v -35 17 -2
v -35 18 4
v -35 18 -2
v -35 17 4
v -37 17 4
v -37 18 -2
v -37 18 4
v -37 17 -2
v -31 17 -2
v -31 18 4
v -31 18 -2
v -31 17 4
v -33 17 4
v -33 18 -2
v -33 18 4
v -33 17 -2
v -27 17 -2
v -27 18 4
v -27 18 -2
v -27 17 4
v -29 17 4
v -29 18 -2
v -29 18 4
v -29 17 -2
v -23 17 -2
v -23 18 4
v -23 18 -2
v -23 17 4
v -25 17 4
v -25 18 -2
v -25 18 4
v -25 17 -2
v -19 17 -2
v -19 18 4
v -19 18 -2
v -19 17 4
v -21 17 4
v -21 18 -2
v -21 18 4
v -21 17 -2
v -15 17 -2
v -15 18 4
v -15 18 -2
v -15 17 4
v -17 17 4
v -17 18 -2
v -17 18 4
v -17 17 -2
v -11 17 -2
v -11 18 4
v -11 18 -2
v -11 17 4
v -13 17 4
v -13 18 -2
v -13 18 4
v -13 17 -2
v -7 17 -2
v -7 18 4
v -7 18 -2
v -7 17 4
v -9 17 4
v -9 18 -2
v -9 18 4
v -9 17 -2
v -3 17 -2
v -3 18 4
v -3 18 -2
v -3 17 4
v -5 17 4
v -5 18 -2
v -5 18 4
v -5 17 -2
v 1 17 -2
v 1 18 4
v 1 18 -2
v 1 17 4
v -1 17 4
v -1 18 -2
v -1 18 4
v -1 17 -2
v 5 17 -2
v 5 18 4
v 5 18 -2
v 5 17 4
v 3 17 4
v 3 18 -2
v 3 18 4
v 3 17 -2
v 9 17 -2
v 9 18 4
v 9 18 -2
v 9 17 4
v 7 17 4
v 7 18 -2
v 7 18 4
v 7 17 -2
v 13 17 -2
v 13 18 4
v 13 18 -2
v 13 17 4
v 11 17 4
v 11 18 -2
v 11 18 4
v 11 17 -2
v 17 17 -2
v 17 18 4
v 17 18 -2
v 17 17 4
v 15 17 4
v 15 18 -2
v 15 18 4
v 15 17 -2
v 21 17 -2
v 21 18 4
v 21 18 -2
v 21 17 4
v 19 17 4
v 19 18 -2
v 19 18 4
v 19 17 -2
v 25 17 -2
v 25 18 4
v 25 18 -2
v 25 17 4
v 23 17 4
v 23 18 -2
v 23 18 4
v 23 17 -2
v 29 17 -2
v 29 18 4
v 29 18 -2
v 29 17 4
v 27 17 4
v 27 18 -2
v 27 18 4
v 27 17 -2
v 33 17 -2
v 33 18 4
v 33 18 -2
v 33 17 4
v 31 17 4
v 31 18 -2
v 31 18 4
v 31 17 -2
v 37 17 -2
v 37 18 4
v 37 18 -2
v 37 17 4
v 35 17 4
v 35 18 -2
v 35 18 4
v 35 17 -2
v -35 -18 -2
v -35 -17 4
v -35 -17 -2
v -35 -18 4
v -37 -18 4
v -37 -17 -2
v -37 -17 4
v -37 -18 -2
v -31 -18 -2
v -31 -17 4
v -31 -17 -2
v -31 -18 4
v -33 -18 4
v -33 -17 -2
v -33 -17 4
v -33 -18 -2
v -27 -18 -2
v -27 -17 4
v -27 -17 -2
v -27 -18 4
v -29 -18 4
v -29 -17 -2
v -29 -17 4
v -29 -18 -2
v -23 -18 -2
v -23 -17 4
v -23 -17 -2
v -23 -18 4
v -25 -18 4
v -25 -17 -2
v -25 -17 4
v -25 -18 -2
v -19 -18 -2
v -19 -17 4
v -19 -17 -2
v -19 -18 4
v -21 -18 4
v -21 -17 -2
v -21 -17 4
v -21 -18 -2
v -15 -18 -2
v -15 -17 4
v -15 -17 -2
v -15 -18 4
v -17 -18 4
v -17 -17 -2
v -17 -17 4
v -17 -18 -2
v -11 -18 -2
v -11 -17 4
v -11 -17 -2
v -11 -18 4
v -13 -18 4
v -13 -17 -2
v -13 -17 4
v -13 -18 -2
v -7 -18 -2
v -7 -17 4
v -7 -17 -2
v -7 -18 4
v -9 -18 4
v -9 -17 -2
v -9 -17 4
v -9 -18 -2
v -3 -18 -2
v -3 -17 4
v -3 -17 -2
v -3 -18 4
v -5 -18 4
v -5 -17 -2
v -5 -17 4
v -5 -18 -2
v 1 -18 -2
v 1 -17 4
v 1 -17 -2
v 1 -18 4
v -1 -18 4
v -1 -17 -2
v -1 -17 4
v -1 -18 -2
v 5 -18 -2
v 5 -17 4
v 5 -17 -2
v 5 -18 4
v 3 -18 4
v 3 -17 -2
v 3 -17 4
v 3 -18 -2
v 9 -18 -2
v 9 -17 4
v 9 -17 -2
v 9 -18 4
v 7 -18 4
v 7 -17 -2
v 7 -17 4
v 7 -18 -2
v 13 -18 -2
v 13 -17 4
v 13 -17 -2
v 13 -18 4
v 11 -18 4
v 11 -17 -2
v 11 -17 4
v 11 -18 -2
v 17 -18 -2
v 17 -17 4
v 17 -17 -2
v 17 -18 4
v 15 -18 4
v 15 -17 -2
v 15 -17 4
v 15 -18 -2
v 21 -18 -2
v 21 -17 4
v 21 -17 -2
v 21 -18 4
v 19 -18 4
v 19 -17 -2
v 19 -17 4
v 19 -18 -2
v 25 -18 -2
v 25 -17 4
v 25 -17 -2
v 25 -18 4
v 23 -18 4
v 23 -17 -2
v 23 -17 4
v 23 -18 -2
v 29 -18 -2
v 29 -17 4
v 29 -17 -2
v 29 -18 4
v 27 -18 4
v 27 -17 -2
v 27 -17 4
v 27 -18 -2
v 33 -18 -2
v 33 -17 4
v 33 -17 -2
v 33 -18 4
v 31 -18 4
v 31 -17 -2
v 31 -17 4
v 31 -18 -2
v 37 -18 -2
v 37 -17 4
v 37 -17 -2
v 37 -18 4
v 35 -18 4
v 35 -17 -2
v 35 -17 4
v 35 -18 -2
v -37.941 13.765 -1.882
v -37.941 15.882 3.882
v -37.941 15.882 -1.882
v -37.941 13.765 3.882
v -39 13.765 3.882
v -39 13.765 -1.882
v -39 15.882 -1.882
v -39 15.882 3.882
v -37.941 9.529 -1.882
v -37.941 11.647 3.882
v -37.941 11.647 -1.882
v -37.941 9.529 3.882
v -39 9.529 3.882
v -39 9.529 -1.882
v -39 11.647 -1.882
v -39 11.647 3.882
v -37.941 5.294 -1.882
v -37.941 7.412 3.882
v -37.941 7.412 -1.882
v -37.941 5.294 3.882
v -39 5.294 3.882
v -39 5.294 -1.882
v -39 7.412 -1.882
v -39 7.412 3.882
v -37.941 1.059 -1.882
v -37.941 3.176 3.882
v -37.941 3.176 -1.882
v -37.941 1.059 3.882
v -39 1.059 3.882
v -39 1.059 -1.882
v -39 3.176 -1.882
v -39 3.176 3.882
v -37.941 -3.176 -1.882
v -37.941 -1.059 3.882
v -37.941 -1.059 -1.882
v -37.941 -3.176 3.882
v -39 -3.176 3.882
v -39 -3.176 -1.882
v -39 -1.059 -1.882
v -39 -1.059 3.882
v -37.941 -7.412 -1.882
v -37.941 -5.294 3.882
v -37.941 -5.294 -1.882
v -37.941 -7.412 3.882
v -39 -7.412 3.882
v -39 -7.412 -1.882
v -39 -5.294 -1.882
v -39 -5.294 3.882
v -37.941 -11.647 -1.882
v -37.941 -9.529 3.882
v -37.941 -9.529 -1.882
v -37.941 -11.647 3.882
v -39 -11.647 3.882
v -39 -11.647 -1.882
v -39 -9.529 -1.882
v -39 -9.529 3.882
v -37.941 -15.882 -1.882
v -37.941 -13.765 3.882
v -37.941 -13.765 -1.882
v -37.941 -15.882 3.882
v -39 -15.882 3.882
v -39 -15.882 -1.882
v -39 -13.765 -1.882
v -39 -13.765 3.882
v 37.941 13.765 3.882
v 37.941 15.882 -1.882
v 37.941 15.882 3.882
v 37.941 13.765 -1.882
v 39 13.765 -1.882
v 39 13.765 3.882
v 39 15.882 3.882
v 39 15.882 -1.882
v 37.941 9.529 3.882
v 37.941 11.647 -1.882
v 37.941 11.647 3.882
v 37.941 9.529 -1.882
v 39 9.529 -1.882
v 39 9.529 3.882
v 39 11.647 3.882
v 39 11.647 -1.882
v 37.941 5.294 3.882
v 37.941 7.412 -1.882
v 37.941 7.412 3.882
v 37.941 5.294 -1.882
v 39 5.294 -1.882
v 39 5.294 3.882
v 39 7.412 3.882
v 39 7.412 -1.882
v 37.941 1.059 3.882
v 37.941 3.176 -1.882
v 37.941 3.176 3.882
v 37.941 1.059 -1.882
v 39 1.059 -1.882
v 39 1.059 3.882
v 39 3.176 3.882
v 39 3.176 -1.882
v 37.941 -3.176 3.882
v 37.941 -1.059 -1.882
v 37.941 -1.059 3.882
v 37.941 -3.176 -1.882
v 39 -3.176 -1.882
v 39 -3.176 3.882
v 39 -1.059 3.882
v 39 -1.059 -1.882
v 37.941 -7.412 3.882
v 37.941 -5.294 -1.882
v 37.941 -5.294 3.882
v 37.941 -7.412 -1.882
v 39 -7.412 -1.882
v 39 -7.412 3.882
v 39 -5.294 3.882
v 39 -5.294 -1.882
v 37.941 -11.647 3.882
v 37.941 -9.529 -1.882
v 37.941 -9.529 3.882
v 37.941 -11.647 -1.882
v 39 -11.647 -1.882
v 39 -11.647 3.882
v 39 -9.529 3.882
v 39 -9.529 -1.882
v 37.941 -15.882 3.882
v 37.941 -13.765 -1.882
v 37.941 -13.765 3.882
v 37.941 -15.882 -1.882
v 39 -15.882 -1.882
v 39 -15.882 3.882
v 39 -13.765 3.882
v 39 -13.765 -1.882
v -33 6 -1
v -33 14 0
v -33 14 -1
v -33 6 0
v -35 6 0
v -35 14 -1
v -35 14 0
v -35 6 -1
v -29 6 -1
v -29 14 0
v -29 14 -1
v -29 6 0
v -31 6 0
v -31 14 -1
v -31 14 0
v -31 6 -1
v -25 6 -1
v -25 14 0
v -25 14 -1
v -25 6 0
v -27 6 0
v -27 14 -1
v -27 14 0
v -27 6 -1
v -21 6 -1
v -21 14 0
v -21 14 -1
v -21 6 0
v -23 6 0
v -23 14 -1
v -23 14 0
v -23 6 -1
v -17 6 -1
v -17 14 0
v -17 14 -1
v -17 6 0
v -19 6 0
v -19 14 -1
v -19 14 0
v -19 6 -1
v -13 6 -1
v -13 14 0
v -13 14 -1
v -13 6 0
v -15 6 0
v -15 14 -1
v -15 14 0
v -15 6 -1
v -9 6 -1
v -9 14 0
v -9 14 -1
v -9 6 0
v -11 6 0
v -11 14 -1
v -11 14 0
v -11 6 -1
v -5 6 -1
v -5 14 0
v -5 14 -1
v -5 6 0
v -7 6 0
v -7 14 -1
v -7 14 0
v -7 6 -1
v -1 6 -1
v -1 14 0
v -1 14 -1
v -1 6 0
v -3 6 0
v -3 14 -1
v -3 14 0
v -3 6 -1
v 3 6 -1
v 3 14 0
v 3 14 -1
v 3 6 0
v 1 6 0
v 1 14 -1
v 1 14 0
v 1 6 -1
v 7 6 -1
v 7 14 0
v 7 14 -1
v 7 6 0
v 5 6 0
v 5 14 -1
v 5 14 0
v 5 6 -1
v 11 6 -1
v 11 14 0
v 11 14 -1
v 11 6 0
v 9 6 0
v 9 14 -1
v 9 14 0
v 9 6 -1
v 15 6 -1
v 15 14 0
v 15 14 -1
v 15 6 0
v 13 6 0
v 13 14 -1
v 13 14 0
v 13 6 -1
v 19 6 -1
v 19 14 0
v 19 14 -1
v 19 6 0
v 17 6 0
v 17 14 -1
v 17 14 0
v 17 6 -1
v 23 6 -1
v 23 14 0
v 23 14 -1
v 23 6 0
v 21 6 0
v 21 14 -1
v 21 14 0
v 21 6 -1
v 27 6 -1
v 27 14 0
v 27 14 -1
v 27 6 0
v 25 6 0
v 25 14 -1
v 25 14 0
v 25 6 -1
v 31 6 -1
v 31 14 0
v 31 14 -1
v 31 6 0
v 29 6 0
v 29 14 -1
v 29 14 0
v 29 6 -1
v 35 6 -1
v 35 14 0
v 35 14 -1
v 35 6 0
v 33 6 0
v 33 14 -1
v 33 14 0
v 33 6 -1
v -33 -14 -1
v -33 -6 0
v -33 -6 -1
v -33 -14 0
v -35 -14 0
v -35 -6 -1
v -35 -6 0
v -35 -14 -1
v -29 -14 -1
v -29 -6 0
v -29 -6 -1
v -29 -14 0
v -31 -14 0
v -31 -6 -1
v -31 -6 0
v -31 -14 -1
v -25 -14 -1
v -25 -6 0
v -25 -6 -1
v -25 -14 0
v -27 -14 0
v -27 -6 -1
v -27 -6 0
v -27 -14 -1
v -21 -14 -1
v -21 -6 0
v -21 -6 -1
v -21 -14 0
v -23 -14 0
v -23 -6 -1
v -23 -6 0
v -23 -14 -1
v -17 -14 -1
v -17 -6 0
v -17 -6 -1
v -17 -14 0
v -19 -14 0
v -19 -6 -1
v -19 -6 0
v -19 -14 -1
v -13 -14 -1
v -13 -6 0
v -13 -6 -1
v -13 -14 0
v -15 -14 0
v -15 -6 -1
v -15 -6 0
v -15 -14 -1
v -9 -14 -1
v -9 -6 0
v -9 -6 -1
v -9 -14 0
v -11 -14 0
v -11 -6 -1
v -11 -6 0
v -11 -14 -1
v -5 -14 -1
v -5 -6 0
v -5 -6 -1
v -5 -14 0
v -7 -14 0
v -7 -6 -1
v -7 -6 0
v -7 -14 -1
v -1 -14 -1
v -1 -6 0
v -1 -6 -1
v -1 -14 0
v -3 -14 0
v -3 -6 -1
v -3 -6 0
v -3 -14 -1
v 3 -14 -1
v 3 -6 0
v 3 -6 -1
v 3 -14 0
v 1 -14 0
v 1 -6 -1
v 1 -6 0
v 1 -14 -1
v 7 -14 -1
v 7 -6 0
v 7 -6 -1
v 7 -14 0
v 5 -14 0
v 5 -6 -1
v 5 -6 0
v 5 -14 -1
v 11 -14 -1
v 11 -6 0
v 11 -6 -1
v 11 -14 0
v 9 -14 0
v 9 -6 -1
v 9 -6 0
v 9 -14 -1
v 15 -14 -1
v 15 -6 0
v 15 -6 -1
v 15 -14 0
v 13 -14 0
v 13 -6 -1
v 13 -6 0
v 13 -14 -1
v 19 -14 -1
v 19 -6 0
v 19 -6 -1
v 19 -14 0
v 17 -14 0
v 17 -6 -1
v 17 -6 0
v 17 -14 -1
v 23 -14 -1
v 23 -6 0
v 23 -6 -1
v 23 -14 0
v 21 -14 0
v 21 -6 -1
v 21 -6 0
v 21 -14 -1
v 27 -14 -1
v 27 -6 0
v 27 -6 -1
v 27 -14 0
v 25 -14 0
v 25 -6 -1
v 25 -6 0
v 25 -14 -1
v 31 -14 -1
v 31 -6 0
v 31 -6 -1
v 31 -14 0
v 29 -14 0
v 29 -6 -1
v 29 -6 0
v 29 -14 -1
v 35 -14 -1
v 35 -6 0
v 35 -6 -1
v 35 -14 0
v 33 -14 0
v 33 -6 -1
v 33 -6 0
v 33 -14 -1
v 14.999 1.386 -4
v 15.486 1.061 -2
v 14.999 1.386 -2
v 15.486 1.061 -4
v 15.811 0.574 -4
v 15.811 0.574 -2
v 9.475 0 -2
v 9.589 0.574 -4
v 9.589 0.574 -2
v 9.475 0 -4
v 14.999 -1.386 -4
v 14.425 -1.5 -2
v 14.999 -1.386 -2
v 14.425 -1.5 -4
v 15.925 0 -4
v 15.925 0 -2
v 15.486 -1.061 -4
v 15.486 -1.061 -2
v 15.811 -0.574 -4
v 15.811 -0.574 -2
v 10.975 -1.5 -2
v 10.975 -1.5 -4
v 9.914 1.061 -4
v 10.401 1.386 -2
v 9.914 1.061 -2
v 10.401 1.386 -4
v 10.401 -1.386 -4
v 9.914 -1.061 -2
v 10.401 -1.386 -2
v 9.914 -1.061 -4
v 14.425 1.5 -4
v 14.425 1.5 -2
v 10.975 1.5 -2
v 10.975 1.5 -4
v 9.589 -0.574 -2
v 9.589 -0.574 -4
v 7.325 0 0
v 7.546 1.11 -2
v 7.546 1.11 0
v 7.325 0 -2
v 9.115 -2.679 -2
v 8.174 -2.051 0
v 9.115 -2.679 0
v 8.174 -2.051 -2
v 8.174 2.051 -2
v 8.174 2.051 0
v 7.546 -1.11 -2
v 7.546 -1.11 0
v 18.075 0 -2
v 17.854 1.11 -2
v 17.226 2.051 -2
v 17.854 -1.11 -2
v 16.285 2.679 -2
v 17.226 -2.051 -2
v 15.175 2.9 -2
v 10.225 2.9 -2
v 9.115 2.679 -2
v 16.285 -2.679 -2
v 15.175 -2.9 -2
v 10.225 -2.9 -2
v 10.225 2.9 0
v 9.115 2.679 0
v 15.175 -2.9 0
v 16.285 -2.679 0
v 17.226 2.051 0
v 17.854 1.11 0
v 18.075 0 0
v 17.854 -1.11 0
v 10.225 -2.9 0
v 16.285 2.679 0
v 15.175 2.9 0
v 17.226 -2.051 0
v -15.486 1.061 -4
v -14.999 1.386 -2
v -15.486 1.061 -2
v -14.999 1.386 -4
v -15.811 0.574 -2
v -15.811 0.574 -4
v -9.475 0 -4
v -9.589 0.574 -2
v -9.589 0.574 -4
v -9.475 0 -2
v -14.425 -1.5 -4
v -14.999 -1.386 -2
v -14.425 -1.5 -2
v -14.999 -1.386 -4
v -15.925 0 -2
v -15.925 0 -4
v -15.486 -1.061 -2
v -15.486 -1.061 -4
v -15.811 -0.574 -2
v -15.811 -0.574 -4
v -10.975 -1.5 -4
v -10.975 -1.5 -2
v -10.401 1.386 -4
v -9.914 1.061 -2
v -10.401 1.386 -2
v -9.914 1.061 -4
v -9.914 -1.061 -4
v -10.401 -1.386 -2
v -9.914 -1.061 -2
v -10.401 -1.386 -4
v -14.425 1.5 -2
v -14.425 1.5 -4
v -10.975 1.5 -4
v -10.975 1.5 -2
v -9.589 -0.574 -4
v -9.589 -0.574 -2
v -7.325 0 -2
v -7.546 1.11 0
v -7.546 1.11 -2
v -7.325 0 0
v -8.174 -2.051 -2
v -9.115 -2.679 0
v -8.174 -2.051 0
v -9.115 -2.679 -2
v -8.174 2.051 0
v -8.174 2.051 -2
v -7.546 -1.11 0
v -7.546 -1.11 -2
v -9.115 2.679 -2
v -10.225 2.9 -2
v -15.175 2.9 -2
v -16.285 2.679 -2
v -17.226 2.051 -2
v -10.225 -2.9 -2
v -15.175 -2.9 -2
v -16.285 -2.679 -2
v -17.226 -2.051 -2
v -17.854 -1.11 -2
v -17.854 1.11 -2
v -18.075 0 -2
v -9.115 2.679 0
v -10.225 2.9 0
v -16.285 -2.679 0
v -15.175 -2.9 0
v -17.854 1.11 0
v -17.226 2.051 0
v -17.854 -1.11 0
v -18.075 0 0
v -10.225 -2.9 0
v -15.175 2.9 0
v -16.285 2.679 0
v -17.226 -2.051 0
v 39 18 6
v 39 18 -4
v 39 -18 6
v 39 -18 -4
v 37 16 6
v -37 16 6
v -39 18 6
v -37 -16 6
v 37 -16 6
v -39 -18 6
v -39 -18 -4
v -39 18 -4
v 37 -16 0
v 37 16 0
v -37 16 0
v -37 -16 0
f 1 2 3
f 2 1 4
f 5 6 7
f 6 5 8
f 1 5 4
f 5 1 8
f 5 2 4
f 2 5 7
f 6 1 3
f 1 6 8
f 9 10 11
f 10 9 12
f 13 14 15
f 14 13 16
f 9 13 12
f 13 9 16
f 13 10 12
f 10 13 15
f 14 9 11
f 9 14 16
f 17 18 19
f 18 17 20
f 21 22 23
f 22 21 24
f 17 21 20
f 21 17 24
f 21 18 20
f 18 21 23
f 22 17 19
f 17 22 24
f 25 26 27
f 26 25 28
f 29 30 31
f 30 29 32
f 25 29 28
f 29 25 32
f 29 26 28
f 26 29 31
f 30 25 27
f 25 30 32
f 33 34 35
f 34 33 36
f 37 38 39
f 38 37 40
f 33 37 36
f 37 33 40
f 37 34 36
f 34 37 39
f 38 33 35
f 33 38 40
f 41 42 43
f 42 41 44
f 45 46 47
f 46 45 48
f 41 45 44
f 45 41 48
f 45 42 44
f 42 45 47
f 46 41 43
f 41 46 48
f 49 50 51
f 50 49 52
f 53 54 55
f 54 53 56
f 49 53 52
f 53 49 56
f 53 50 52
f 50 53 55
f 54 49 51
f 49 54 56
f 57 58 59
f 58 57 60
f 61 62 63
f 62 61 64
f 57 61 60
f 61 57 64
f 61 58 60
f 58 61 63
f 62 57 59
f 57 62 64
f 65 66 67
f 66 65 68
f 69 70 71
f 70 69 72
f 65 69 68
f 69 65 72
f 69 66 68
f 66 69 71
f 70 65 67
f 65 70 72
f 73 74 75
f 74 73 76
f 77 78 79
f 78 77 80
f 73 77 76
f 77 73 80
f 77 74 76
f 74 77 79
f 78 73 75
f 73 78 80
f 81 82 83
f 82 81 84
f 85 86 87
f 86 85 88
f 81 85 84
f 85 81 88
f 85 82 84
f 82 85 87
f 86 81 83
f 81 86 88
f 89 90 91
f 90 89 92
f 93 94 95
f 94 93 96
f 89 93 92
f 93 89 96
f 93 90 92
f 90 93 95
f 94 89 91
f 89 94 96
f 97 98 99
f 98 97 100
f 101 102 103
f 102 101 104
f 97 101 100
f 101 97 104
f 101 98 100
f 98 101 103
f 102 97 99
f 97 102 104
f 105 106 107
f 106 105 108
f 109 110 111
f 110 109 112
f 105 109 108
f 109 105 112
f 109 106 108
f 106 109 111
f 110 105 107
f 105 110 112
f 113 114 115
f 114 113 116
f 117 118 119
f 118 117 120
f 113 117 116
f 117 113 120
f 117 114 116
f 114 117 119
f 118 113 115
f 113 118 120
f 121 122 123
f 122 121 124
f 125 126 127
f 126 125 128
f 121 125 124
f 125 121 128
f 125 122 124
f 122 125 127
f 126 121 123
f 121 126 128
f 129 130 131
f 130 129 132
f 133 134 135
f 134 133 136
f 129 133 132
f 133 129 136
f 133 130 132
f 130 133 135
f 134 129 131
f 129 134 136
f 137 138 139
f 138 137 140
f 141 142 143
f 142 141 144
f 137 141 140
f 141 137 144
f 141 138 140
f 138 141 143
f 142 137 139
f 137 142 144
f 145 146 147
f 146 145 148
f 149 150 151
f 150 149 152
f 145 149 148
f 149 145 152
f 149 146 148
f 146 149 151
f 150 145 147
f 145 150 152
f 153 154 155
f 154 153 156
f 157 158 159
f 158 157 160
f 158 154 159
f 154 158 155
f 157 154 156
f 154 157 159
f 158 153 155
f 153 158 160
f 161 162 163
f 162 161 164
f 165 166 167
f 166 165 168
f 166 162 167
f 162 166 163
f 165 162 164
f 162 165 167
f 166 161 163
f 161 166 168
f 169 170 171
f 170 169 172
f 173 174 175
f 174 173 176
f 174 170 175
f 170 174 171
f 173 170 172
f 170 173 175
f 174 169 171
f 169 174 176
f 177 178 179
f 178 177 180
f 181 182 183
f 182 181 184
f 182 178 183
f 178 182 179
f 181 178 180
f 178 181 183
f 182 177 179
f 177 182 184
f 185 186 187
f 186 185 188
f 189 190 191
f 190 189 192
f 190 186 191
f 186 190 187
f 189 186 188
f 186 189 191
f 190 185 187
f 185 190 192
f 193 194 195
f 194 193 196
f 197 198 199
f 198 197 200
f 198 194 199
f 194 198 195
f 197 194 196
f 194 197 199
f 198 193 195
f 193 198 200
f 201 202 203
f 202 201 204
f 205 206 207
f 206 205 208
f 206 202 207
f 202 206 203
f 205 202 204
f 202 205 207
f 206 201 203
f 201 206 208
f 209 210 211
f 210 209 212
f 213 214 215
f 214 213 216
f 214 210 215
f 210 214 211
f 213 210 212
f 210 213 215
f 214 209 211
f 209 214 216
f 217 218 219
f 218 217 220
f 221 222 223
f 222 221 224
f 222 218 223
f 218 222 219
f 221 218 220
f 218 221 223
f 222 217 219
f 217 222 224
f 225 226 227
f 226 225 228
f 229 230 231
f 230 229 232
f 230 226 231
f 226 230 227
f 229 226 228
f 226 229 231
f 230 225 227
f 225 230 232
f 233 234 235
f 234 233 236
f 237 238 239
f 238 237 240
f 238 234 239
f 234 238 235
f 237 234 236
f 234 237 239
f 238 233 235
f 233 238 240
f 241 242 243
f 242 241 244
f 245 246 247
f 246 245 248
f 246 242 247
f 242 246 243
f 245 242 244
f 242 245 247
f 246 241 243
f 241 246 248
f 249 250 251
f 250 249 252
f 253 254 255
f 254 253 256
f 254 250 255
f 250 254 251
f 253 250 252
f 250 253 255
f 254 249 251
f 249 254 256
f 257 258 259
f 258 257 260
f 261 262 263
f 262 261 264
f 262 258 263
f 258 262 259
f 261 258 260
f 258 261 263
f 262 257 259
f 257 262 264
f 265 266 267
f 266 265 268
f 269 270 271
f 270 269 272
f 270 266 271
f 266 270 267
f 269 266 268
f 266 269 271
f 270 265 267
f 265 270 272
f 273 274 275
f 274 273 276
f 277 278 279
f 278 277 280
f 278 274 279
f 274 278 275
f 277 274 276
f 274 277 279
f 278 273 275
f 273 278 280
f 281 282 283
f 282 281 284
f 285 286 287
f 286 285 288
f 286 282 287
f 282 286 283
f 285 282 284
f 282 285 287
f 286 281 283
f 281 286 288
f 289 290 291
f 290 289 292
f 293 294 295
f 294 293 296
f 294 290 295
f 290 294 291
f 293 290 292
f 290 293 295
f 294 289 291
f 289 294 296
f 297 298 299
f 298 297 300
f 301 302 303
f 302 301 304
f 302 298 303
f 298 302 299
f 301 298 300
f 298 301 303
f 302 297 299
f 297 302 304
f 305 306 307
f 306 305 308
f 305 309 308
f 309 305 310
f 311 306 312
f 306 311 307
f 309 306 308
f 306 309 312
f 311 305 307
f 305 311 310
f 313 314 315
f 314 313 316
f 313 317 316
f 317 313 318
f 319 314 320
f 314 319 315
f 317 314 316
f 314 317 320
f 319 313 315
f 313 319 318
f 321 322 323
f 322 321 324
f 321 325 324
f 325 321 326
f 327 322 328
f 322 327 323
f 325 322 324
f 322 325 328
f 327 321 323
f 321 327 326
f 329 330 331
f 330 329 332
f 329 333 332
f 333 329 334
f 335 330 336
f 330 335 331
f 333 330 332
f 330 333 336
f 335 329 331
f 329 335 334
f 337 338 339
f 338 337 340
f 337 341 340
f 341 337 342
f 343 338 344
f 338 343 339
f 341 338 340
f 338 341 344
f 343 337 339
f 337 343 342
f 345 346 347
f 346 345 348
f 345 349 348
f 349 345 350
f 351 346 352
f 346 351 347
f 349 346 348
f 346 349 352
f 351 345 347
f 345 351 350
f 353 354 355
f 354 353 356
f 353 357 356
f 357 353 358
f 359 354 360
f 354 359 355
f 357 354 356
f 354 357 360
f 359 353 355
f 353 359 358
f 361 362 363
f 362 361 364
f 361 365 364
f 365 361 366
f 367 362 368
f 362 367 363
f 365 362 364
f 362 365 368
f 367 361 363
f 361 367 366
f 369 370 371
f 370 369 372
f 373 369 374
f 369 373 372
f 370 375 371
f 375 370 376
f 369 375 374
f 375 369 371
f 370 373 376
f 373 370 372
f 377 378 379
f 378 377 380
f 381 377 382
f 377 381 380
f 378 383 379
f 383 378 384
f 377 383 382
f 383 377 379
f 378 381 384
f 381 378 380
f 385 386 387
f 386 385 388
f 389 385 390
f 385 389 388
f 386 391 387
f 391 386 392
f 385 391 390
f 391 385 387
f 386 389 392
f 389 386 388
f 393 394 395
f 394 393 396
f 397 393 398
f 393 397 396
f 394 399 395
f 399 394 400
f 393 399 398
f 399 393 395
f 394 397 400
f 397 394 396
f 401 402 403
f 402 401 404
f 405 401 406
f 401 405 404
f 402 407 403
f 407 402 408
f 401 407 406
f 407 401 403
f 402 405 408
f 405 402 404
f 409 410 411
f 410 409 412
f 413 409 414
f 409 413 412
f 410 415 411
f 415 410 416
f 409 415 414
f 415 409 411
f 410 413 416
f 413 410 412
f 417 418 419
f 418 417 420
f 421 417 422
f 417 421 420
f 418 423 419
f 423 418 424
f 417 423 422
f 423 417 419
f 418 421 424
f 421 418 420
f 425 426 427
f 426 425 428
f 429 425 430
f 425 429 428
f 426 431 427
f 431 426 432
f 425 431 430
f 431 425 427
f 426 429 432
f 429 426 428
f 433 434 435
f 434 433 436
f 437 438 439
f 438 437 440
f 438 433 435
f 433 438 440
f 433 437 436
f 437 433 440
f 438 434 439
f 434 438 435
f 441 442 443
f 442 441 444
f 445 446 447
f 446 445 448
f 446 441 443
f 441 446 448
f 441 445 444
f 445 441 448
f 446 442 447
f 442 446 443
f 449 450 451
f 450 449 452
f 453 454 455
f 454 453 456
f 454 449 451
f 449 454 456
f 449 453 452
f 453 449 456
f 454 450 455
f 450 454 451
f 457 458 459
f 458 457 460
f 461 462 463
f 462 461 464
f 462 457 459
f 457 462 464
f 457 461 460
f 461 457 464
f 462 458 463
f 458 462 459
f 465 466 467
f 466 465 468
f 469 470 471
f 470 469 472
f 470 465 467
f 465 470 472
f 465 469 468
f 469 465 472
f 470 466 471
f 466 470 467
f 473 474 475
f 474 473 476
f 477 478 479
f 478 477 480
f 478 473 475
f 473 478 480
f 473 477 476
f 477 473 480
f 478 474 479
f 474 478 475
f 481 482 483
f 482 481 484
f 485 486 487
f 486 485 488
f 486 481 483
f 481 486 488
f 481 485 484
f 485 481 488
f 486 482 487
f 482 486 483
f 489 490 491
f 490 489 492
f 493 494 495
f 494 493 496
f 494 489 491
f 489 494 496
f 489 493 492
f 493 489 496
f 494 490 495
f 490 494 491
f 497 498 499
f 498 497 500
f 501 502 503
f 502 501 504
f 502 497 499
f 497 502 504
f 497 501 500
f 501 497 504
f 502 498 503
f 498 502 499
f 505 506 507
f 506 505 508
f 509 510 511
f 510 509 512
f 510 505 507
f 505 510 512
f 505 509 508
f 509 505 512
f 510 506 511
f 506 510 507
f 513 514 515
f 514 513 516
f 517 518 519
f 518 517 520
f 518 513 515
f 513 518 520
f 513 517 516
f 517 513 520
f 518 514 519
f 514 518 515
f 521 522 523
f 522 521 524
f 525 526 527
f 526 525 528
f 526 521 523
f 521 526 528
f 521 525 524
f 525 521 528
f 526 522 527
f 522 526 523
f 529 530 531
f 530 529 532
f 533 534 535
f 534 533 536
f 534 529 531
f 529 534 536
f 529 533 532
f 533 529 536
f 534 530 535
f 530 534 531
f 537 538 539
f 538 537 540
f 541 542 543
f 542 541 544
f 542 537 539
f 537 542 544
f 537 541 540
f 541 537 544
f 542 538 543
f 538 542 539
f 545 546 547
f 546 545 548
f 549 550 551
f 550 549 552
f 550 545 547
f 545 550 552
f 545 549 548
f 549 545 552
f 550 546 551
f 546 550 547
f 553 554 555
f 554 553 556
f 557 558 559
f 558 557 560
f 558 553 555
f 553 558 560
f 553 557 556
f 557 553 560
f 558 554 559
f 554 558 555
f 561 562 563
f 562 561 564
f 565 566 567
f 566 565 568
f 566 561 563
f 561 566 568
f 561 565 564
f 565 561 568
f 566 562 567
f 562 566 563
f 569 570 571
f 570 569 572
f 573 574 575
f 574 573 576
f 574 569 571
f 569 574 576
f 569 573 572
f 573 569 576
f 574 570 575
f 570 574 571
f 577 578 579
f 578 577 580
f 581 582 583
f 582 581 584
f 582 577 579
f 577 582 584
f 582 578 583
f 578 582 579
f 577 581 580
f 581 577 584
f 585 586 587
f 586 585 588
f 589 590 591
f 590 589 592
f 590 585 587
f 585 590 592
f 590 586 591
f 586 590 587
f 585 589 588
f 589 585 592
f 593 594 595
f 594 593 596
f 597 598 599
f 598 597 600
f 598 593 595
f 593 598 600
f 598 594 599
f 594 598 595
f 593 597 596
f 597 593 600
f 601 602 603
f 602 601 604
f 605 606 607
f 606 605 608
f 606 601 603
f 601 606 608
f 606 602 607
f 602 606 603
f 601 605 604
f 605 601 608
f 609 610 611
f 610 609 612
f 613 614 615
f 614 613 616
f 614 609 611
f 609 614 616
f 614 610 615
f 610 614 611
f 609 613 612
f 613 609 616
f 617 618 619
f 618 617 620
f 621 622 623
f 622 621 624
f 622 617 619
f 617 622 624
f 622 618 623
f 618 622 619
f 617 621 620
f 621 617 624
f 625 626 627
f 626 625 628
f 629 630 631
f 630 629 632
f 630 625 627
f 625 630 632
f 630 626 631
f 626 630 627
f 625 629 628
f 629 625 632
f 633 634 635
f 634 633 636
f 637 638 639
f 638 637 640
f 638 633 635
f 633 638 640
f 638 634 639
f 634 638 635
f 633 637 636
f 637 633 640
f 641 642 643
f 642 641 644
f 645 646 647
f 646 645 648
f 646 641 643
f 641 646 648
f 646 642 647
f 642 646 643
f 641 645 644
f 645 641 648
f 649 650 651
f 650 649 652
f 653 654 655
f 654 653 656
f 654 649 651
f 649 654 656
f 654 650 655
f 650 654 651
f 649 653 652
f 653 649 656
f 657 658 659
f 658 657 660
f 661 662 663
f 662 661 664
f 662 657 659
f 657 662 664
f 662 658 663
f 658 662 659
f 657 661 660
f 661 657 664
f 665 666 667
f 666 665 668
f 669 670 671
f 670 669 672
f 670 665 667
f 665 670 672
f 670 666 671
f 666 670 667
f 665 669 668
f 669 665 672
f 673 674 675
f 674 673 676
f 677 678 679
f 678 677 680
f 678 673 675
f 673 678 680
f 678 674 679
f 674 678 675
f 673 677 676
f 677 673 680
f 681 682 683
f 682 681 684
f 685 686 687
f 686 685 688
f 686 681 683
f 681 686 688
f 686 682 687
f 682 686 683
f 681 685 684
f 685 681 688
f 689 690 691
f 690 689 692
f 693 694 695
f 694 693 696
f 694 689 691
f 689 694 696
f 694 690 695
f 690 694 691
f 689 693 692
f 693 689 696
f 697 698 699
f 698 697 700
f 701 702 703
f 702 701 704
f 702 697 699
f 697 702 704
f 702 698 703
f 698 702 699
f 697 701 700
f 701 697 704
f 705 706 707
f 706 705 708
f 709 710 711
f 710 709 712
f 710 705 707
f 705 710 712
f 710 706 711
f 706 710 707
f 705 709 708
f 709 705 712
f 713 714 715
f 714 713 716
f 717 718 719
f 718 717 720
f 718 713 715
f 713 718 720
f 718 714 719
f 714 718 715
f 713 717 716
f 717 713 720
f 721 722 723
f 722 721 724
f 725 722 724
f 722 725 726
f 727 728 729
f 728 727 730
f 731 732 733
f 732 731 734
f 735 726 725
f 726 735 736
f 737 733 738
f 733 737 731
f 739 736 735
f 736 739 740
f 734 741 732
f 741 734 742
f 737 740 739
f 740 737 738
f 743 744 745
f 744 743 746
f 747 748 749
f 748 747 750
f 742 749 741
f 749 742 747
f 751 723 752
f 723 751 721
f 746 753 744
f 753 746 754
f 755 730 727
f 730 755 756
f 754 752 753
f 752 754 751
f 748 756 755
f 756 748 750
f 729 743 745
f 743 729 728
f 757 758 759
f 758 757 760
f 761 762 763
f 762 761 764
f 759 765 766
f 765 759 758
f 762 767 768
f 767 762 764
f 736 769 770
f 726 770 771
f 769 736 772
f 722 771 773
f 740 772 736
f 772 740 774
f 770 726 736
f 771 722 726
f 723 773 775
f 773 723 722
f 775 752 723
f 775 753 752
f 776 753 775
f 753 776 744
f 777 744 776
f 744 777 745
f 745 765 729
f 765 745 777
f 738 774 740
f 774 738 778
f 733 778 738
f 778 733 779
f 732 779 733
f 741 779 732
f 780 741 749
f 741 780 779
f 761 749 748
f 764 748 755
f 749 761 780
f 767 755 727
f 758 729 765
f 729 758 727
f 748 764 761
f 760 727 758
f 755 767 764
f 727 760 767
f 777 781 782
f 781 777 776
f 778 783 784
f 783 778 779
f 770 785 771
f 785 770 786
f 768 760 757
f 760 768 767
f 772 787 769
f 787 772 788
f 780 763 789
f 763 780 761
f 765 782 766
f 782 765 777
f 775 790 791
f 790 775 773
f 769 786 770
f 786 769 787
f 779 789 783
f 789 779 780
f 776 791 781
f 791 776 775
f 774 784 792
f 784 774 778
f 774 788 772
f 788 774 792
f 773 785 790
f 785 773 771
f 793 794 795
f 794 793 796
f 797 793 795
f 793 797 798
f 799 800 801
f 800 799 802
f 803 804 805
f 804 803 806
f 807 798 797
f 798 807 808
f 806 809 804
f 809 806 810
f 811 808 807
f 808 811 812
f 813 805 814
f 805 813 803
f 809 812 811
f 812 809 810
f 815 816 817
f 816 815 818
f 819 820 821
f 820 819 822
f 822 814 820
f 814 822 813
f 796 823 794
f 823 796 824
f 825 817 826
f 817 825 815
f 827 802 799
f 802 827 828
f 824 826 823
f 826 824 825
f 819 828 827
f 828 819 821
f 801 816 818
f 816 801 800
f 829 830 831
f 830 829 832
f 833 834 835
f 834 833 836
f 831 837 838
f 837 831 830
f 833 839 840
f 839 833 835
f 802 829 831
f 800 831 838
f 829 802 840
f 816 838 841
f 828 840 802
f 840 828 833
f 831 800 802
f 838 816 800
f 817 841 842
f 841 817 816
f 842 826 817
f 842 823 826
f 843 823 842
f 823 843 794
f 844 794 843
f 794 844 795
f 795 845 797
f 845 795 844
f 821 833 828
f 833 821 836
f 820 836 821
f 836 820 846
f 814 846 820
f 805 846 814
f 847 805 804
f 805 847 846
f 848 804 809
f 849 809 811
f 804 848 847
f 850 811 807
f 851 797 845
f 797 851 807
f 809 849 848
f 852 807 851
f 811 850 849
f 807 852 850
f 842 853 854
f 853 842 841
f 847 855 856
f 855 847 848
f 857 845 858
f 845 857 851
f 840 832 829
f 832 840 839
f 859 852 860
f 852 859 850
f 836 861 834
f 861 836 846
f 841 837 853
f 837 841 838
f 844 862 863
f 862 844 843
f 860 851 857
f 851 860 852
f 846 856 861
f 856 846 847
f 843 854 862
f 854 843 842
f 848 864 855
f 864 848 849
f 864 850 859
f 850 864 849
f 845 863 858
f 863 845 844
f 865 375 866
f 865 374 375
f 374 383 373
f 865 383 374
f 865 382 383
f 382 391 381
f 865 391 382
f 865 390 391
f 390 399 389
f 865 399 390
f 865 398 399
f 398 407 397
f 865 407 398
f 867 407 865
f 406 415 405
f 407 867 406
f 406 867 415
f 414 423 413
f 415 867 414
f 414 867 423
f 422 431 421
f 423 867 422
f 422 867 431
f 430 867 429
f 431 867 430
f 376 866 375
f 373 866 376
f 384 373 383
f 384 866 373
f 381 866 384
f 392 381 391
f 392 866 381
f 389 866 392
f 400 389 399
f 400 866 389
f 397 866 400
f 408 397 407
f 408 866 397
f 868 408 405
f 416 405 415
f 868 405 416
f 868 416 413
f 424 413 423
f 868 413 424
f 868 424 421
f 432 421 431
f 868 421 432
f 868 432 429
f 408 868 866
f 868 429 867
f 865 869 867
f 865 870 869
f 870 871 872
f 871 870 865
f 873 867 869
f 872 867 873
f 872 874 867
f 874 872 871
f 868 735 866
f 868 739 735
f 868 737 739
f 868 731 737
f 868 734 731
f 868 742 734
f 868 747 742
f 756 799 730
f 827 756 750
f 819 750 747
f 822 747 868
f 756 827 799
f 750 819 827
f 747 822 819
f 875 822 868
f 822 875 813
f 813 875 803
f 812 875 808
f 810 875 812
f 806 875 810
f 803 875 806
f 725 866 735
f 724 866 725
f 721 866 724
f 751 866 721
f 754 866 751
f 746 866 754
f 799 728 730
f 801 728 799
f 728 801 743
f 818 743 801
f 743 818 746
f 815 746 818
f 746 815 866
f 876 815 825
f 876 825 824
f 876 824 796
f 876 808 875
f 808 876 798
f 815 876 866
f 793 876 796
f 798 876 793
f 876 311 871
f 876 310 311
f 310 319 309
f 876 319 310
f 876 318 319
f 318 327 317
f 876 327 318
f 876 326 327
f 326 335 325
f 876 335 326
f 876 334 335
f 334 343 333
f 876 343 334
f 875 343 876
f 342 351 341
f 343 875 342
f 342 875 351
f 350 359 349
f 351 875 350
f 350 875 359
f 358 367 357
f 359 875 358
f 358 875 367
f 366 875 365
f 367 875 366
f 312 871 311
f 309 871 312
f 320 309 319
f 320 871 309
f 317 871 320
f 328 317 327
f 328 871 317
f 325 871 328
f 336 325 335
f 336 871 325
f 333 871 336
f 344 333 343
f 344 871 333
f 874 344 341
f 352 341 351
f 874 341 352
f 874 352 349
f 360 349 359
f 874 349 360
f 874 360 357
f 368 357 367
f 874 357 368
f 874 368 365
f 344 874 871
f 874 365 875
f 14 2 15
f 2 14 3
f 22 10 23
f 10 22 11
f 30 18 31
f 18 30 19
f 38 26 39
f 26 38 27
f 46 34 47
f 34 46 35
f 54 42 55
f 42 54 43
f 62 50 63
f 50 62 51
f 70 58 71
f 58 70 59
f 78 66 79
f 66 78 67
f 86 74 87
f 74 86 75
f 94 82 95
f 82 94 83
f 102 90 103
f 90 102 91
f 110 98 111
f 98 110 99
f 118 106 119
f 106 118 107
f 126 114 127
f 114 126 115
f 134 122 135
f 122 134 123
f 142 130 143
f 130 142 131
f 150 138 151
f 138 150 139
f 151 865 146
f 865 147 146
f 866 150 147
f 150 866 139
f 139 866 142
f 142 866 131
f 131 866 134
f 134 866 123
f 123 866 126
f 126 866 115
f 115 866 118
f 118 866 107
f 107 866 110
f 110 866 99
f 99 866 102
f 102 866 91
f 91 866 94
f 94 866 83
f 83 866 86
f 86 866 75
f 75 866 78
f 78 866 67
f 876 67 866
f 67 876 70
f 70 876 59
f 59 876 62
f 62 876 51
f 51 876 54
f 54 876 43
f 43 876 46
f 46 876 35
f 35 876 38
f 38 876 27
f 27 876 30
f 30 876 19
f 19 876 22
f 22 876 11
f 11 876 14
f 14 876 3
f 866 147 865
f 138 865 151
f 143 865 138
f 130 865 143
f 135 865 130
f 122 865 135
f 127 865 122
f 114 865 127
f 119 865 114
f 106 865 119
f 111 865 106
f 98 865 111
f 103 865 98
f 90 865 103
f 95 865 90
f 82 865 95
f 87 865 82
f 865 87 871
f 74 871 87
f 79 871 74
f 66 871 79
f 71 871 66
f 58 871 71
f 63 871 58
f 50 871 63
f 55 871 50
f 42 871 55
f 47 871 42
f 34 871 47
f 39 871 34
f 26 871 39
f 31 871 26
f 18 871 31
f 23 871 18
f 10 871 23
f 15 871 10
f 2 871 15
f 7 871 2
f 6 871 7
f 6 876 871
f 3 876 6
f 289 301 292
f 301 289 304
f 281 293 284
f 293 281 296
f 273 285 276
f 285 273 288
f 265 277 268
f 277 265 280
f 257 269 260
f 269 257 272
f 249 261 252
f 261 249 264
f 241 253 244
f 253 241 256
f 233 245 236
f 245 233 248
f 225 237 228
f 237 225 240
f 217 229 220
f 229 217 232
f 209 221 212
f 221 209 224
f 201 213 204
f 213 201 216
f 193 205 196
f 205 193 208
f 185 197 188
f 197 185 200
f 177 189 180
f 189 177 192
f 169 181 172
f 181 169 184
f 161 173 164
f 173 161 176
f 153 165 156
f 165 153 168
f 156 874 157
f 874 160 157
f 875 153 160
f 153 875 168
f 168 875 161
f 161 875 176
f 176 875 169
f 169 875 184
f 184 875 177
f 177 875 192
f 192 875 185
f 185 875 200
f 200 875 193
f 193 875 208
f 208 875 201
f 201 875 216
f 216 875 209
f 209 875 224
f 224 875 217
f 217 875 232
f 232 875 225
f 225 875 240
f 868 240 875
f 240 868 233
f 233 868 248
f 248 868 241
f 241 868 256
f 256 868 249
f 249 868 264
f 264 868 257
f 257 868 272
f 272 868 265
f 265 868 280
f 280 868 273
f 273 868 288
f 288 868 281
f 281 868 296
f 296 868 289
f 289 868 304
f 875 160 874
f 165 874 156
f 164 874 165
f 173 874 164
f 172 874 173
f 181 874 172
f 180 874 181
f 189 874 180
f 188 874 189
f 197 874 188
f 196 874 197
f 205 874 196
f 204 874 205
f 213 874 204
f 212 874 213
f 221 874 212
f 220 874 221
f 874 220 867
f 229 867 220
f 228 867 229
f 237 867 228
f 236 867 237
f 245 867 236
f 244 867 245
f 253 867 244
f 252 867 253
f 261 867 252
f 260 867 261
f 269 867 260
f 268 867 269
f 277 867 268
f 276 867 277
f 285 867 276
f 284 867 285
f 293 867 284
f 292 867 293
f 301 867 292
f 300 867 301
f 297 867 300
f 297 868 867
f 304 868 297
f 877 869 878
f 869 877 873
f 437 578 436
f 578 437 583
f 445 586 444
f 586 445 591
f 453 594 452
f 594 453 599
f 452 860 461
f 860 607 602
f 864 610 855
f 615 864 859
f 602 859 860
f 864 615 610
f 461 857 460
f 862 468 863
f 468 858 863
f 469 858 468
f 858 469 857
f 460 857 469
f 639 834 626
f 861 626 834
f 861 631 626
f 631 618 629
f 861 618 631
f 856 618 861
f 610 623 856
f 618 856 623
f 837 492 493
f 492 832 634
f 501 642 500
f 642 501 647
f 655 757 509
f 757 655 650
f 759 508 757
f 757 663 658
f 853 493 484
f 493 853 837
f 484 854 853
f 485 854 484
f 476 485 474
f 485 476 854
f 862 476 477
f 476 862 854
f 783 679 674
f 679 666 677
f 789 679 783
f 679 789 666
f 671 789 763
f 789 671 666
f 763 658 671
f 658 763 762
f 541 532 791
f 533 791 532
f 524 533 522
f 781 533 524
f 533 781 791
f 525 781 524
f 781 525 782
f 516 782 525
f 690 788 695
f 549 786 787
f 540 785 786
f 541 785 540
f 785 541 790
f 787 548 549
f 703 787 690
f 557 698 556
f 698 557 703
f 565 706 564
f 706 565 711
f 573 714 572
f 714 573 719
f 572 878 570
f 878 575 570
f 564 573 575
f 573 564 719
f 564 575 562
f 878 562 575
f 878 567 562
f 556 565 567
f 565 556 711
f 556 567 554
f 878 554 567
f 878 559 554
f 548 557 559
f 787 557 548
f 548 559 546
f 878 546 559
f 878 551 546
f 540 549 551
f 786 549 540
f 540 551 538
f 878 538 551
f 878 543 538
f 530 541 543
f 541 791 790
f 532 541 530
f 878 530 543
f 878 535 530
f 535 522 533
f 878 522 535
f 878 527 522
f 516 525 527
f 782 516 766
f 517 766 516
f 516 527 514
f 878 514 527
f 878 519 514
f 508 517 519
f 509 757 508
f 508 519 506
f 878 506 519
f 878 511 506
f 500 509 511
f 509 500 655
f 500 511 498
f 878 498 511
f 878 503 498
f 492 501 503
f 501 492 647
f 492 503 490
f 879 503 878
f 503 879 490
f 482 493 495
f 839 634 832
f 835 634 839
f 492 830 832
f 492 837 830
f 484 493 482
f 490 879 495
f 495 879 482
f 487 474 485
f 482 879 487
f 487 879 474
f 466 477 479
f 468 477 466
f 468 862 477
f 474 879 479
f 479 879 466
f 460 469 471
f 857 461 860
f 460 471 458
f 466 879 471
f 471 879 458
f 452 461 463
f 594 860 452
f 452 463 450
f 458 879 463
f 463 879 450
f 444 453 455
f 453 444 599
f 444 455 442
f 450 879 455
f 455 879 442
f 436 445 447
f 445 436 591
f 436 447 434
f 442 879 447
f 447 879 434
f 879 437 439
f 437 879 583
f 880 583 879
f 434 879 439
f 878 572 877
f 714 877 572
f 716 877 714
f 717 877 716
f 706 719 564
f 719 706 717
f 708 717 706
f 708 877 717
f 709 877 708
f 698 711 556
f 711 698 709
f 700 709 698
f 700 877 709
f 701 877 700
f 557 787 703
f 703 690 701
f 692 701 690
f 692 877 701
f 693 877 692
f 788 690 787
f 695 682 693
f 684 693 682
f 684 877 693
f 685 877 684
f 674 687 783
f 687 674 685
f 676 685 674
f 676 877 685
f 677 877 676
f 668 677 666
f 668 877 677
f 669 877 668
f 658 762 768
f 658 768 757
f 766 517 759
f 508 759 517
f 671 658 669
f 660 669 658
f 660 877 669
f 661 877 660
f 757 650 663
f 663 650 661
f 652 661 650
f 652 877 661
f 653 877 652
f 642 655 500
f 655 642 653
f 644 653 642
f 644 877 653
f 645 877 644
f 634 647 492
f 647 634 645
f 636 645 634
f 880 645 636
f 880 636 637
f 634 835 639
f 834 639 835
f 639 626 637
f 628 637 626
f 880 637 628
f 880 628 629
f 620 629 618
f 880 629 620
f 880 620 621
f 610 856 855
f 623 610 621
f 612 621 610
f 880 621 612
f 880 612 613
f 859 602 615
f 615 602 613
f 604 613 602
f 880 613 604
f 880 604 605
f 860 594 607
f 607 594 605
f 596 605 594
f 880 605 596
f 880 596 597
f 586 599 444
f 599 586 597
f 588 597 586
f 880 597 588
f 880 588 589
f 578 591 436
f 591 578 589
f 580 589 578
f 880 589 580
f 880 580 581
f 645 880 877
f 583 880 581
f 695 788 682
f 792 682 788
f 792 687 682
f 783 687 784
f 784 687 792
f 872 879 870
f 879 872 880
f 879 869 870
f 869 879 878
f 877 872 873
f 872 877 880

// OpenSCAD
// file: syms.scad
module symY(t) {
    translate(t)
        children();
    mirror([0,1,0])
        translate(t)
            children();
}
module symX(t) {
    translate(t)
        children();
    mirror([1,0,0])
        translate(t)
            children();
}

module symZ(t) {
    translate(t)
        children();
    mirror([0,0,1])
        translate(t)
            children();
}

module	symXY(t) {
	tx=t[0];
	ty=t[1];
	tz=t[2];
	symX([tx,0,0])
	symY([0,ty,tz])
		children();
}
// main file
use <syms.scad>

M_L=74;
M_W=32;
M_H=6;

W=2;

//30-36
SCREWHOLE_I1=25.4;
SCREWHOLE_I2=35.3;
SCREWHOLE_D=3;
SCREWHOLE_D2=5.8;



module decorationCuts(xSpace,ySpace){
    CUTW0=W;
    N=floor((ySpace-CUTW0) / (2*CUTW0) );
    //N=3;
    CUTW=ySpace / (2*N+1);
    echo(CUTW);
    
    for(z=[CUTW+CUTW/2:2*CUTW:ySpace])
    translate([0,0,z])
    cube([CUTW,xSpace-2*CUTW,CUTW],center=true);
}


difference() {
    E_L=M_L+2*W;
    E_W=M_W+2*W;
    E_H=M_H+2*W;
    translate([0,0,M_H/2-W])
    cube([M_L+2*W,M_W+2*W,M_H+2*W],center=true);

    translate([0,0,M_H/2+1])
    cube([M_L,M_W,M_H+2],center=true);


    symY([-E_L/2,E_W/2,E_H/2-W-W])
    rotate(90)
    rotate(90,[1,0,0])
    decorationCuts(E_H,E_L);

    symX([-E_L/2,E_W/2,E_H/2-W-W])
    rotate(0)
    rotate(90,[1,0,0])
    decorationCuts(E_H,E_W);

    symY([-M_L/2,E_W/3-W,0])
    rotate(90,[1,0,0])
    rotate(90)
    rotate(90,[1,0,0])
    decorationCuts(E_W/3,M_L);
    
    symX([SCREWHOLE_I1/2,0,-W]) {
        $fn=16;
        hull()
        symX([(SCREWHOLE_I2-SCREWHOLE_I1-SCREWHOLE_D)/4,0,0])
        cylinder(d=SCREWHOLE_D,h=10,center=true);
        hull()
        symX([(SCREWHOLE_I2-SCREWHOLE_I1)/4,0,0])
        cylinder(d=SCREWHOLE_D2,h=10);
    }

}
